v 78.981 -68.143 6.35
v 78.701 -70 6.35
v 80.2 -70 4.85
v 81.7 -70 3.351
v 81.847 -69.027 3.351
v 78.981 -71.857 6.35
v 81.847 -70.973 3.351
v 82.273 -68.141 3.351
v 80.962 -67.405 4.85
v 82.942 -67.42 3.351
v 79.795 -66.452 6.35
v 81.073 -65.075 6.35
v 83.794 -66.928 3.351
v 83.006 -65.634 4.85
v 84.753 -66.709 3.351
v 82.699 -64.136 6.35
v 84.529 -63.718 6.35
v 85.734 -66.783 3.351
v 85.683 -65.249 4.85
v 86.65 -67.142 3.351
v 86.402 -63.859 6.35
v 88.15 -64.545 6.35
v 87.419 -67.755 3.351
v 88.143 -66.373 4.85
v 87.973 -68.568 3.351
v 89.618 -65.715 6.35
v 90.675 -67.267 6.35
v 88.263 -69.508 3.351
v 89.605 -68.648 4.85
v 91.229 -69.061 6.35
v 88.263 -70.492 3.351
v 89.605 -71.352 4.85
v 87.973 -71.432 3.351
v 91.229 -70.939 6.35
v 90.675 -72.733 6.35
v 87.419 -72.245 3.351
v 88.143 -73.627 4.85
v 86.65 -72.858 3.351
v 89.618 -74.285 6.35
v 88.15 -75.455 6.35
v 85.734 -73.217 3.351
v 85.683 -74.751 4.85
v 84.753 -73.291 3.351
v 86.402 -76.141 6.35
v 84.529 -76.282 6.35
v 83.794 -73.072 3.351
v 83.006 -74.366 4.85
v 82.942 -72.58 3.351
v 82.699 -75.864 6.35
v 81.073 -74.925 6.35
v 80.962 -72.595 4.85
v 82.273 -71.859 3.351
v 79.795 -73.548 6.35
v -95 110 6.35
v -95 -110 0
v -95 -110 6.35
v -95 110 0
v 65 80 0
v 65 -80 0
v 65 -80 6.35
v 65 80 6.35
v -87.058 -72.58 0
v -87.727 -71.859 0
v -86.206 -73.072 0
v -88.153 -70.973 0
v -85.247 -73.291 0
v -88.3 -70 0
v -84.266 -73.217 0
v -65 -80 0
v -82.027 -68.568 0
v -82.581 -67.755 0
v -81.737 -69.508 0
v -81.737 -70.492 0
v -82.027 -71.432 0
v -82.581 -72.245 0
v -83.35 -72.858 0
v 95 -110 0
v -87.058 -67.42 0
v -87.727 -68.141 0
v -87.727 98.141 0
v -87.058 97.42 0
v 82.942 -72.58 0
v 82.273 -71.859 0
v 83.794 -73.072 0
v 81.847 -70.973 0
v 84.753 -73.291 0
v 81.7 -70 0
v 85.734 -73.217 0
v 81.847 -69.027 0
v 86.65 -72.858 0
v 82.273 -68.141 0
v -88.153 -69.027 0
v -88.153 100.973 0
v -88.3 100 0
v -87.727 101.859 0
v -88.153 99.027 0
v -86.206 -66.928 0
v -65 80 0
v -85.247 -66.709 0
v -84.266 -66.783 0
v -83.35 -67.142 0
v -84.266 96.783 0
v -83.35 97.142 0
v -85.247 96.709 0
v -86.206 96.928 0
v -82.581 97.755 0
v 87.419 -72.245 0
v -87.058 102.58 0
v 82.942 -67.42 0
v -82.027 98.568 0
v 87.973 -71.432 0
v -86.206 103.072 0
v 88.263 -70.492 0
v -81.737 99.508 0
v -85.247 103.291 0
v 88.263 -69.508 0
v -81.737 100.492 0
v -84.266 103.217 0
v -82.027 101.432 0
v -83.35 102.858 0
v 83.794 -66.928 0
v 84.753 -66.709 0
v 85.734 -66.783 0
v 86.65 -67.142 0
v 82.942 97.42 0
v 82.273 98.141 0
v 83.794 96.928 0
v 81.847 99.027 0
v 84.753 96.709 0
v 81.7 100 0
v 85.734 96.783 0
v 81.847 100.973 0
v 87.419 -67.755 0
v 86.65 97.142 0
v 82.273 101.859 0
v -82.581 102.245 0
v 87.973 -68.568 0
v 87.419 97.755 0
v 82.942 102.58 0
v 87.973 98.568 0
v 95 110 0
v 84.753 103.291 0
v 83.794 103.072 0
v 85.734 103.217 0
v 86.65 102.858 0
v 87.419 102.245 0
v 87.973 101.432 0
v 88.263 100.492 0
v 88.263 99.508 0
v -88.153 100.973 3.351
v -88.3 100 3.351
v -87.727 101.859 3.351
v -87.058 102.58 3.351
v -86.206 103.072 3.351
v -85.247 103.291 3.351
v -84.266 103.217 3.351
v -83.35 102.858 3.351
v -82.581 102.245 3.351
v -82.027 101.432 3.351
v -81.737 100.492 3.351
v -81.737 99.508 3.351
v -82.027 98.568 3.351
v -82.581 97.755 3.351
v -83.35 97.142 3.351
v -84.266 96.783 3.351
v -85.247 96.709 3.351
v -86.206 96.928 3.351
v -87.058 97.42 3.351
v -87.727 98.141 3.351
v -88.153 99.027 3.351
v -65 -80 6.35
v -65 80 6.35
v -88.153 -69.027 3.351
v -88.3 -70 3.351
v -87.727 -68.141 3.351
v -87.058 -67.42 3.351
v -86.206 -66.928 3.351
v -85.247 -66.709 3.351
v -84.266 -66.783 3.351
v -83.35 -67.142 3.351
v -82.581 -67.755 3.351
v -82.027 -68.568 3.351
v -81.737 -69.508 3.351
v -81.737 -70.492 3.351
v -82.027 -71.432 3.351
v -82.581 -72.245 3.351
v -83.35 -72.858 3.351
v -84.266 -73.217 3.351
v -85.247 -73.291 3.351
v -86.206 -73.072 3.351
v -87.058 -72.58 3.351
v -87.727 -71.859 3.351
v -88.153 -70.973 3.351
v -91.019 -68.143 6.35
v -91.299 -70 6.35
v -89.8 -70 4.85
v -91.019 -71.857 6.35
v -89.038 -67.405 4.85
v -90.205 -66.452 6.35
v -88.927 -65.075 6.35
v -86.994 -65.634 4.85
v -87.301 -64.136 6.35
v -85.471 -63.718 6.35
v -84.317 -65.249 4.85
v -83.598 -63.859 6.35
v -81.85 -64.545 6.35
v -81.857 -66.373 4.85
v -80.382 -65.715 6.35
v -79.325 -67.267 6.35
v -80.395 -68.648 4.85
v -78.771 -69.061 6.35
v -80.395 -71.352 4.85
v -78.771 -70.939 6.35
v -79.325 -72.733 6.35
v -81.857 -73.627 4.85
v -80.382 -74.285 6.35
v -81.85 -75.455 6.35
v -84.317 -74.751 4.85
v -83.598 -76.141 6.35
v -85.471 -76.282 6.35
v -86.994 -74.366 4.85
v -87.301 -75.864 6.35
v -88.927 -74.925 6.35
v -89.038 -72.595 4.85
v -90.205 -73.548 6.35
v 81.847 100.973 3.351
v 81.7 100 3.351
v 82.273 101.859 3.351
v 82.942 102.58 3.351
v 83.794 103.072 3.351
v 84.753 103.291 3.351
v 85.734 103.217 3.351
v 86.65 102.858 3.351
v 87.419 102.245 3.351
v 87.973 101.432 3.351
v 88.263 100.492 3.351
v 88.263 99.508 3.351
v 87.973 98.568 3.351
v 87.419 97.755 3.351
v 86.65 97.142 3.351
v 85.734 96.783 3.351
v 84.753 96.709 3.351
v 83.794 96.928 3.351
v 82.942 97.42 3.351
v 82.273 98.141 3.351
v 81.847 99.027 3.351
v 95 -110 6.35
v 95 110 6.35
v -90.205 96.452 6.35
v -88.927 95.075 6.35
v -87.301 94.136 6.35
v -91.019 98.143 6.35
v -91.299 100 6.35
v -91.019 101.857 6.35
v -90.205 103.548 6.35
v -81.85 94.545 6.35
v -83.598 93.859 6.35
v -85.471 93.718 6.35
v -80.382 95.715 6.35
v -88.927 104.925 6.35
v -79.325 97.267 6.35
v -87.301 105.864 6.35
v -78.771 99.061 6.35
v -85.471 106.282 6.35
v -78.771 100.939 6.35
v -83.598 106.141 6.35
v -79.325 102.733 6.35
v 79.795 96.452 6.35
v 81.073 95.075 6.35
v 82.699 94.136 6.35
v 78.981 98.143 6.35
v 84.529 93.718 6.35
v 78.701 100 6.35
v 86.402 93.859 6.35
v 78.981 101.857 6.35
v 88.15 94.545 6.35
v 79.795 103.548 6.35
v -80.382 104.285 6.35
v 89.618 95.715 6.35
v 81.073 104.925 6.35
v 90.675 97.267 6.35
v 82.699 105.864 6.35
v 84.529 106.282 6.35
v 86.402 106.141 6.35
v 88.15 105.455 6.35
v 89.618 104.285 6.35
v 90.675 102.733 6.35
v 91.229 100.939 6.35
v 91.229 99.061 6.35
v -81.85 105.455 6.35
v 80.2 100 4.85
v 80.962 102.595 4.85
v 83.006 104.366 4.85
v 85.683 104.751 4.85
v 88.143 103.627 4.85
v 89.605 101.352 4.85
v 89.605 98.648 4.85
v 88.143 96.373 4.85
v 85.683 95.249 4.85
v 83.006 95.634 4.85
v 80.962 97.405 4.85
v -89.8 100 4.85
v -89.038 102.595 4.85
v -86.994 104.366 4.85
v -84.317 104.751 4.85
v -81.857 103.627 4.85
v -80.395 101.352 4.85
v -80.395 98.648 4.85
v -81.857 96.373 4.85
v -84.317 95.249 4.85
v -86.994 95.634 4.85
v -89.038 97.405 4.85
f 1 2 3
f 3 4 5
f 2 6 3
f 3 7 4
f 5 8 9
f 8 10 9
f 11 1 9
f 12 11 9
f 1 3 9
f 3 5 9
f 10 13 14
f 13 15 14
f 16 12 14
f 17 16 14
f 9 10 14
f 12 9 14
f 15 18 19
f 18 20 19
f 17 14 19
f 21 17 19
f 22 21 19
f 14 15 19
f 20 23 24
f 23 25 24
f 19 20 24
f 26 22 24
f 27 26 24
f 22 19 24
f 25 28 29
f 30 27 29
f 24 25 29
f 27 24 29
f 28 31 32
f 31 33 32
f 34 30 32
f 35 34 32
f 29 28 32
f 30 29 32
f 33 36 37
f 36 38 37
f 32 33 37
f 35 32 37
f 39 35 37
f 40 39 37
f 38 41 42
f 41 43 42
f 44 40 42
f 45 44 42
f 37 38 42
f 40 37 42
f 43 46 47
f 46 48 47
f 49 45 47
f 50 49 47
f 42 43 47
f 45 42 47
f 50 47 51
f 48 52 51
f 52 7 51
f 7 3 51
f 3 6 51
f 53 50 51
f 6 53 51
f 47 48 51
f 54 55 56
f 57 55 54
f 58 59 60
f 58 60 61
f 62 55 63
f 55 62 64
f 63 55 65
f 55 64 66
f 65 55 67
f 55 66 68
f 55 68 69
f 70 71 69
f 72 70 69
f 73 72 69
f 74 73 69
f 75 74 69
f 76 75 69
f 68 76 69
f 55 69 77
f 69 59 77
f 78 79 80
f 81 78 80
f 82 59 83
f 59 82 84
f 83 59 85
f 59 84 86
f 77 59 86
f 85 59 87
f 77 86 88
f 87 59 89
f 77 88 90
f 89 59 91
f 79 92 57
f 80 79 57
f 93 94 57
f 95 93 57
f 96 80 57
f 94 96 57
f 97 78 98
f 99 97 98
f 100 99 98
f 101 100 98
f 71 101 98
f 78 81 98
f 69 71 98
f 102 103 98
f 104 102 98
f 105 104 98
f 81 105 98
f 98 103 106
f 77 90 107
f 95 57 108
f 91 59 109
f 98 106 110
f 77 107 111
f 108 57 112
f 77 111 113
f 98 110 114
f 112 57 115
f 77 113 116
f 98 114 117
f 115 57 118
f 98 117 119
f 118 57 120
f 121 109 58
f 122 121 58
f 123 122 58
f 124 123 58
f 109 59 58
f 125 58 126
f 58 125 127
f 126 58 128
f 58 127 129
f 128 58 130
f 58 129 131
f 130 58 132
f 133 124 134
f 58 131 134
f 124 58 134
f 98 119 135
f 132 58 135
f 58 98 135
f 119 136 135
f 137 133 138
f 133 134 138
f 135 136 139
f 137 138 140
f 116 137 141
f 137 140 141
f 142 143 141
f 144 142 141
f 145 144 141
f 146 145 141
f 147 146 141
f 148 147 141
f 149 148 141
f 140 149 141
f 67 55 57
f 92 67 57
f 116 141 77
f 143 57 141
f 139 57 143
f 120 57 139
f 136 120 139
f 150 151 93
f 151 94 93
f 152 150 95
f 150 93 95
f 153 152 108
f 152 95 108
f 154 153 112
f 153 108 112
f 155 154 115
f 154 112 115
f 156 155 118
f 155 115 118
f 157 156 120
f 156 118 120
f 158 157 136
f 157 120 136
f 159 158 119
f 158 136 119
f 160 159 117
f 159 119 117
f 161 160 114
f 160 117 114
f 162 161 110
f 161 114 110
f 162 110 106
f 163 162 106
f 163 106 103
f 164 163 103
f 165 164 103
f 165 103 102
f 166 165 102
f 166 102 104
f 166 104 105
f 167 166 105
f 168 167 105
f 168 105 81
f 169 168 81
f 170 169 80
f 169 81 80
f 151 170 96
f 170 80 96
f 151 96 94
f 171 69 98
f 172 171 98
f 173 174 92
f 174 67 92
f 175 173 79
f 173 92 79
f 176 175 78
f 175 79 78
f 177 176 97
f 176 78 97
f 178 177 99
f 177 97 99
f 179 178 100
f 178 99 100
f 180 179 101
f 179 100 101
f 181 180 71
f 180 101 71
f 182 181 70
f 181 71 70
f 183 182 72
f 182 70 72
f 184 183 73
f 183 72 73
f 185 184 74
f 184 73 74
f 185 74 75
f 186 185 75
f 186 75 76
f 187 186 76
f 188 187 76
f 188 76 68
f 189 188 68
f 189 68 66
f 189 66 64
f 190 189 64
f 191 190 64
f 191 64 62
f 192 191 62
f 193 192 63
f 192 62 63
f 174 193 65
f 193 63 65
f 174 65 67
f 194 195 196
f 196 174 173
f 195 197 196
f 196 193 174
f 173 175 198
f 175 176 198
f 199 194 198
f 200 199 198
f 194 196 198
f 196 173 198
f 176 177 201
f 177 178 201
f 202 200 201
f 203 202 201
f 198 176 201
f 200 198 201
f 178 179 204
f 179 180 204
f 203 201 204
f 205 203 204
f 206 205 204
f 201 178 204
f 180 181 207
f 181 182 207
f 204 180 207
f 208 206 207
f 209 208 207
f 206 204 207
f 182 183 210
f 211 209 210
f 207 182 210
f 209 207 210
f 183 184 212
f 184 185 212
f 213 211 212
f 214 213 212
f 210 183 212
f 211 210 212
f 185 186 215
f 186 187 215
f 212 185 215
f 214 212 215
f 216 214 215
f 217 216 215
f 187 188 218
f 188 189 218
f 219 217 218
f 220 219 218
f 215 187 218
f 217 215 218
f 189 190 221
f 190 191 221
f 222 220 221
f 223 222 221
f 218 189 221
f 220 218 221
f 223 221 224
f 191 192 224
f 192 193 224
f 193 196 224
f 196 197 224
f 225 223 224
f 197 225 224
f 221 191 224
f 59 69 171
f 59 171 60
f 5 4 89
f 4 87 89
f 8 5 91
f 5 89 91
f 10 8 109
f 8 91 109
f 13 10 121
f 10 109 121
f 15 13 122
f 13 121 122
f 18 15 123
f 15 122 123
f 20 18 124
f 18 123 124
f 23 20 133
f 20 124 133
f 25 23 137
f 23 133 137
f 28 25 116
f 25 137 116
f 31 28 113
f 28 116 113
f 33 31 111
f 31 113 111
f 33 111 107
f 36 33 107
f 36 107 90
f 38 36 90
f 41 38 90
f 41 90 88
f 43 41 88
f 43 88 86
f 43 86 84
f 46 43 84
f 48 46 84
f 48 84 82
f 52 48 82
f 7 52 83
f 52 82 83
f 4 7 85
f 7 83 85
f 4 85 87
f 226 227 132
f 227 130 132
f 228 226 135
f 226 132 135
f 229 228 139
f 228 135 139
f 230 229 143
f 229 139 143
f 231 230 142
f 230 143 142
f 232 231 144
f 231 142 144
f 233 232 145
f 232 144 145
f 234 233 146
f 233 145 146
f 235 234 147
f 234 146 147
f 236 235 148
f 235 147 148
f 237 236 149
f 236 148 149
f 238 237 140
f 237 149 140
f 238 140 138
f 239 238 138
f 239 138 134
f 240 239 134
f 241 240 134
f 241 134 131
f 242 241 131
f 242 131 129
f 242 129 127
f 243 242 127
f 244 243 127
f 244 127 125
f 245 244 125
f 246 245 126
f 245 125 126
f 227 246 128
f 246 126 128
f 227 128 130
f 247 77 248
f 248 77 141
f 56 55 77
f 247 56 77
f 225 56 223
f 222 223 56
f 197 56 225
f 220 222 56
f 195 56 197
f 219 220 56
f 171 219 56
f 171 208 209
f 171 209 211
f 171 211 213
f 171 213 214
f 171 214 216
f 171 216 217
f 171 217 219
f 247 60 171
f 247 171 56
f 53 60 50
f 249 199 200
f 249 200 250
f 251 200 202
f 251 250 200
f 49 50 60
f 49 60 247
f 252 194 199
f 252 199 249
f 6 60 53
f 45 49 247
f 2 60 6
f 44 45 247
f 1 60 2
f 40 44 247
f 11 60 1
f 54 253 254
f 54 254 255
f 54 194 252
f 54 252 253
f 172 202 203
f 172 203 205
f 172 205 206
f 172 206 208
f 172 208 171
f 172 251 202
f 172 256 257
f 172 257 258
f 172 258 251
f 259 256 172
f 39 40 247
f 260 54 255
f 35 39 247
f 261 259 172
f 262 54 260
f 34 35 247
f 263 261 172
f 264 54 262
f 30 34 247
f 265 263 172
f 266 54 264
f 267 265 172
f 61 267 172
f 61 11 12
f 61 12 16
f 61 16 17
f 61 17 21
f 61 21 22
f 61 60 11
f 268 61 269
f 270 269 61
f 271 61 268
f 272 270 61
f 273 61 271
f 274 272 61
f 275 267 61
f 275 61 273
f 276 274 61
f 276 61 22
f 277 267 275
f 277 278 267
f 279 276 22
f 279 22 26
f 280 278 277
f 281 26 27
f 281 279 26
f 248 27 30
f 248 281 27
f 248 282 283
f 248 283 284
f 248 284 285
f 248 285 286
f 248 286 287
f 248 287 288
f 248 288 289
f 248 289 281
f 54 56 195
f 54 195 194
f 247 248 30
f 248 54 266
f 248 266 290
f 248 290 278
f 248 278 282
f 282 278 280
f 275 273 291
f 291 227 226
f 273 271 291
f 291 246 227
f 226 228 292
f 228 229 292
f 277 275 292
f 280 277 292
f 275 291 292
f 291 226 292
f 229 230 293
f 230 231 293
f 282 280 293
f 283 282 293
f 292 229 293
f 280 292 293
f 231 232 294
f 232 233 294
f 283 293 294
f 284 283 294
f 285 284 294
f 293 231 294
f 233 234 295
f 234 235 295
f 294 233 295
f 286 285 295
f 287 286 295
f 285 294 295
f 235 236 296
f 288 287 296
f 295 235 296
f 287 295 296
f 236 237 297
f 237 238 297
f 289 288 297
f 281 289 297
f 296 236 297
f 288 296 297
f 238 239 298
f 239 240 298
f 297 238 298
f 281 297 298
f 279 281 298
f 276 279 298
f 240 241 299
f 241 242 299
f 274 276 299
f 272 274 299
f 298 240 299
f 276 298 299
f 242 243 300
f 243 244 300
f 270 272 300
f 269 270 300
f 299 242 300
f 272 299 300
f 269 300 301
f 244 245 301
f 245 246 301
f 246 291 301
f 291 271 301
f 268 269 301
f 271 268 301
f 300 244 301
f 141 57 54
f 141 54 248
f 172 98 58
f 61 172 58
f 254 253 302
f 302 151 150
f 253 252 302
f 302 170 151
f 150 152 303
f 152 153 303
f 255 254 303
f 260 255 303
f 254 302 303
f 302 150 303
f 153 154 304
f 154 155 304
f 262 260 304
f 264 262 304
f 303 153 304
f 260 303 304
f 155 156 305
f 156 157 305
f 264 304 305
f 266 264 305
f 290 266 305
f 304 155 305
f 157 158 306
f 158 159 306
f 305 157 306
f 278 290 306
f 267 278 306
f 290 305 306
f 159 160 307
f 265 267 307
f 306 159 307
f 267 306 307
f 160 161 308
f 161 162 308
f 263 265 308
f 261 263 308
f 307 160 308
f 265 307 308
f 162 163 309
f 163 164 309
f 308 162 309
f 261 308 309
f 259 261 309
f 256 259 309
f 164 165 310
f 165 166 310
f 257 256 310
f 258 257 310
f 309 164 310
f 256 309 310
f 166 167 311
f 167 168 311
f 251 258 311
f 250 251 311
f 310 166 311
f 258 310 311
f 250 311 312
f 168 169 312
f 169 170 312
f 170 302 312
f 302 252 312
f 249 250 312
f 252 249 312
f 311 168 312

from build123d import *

# Parameters (mm, degrees)
SKETCH1_W                                           = 190
SKETCH1_H                                           = 220
SKETCH1_W_2                                         = 130
SKETCH1_H_2                                         = 160
BOSS_EXTRUDE1_DEPTH                                 = 6.35
CSK_FOR_M6_COUNTERSUNK_FLAT_HEAD_SCREW1_D           = 6.6
CSK_FOR_M6_COUNTERSUNK_FLAT_HEAD_SCREW1_DEPTH       = 45
CSK_FOR_M6_COUNTERSUNK_FLAT_HEAD_SCREW1_CSINK_D     = 12.5984
CSK_FOR_M6_COUNTERSUNK_FLAT_HEAD_SCREW1_CSINK_ANGLE = 90
CSK_FOR_M6_COUNTERSUNK_FLAT_HEAD_SCREW1_TIP         = 1.982840043


with BuildPart() as part:
    # Sketch1 → Boss-Extrude1 (new body)
    with BuildSketch(Plane.XY):
        Rectangle(SKETCH1_W, SKETCH1_H)
        Rectangle(SKETCH1_W_2, SKETCH1_H_2, mode=Mode.SUBTRACT)
    extrude(amount=BOSS_EXTRUDE1_DEPTH)

    # CSK for M6 Countersunk Flat Head Screw1
    with Locations(Plane.XY.offset(6.35)):
        with Locations((-85, -70), (-85, 100), (85, 100), (85, -70)):
            CounterSinkHole(CSK_FOR_M6_COUNTERSUNK_FLAT_HEAD_SCREW1_D / 2, CSK_FOR_M6_COUNTERSUNK_FLAT_HEAD_SCREW1_CSINK_D / 2, depth=CSK_FOR_M6_COUNTERSUNK_FLAT_HEAD_SCREW1_DEPTH, counter_sink_angle=CSK_FOR_M6_COUNTERSUNK_FLAT_HEAD_SCREW1_CSINK_ANGLE)
            with Locations((0, 0, -(CSK_FOR_M6_COUNTERSUNK_FLAT_HEAD_SCREW1_DEPTH + CSK_FOR_M6_COUNTERSUNK_FLAT_HEAD_SCREW1_TIP / 2))):  # 118° drill point
                Cone(0, CSK_FOR_M6_COUNTERSUNK_FLAT_HEAD_SCREW1_D / 2, CSK_FOR_M6_COUNTERSUNK_FLAT_HEAD_SCREW1_TIP, mode=Mode.SUBTRACT)


solid = part.part
